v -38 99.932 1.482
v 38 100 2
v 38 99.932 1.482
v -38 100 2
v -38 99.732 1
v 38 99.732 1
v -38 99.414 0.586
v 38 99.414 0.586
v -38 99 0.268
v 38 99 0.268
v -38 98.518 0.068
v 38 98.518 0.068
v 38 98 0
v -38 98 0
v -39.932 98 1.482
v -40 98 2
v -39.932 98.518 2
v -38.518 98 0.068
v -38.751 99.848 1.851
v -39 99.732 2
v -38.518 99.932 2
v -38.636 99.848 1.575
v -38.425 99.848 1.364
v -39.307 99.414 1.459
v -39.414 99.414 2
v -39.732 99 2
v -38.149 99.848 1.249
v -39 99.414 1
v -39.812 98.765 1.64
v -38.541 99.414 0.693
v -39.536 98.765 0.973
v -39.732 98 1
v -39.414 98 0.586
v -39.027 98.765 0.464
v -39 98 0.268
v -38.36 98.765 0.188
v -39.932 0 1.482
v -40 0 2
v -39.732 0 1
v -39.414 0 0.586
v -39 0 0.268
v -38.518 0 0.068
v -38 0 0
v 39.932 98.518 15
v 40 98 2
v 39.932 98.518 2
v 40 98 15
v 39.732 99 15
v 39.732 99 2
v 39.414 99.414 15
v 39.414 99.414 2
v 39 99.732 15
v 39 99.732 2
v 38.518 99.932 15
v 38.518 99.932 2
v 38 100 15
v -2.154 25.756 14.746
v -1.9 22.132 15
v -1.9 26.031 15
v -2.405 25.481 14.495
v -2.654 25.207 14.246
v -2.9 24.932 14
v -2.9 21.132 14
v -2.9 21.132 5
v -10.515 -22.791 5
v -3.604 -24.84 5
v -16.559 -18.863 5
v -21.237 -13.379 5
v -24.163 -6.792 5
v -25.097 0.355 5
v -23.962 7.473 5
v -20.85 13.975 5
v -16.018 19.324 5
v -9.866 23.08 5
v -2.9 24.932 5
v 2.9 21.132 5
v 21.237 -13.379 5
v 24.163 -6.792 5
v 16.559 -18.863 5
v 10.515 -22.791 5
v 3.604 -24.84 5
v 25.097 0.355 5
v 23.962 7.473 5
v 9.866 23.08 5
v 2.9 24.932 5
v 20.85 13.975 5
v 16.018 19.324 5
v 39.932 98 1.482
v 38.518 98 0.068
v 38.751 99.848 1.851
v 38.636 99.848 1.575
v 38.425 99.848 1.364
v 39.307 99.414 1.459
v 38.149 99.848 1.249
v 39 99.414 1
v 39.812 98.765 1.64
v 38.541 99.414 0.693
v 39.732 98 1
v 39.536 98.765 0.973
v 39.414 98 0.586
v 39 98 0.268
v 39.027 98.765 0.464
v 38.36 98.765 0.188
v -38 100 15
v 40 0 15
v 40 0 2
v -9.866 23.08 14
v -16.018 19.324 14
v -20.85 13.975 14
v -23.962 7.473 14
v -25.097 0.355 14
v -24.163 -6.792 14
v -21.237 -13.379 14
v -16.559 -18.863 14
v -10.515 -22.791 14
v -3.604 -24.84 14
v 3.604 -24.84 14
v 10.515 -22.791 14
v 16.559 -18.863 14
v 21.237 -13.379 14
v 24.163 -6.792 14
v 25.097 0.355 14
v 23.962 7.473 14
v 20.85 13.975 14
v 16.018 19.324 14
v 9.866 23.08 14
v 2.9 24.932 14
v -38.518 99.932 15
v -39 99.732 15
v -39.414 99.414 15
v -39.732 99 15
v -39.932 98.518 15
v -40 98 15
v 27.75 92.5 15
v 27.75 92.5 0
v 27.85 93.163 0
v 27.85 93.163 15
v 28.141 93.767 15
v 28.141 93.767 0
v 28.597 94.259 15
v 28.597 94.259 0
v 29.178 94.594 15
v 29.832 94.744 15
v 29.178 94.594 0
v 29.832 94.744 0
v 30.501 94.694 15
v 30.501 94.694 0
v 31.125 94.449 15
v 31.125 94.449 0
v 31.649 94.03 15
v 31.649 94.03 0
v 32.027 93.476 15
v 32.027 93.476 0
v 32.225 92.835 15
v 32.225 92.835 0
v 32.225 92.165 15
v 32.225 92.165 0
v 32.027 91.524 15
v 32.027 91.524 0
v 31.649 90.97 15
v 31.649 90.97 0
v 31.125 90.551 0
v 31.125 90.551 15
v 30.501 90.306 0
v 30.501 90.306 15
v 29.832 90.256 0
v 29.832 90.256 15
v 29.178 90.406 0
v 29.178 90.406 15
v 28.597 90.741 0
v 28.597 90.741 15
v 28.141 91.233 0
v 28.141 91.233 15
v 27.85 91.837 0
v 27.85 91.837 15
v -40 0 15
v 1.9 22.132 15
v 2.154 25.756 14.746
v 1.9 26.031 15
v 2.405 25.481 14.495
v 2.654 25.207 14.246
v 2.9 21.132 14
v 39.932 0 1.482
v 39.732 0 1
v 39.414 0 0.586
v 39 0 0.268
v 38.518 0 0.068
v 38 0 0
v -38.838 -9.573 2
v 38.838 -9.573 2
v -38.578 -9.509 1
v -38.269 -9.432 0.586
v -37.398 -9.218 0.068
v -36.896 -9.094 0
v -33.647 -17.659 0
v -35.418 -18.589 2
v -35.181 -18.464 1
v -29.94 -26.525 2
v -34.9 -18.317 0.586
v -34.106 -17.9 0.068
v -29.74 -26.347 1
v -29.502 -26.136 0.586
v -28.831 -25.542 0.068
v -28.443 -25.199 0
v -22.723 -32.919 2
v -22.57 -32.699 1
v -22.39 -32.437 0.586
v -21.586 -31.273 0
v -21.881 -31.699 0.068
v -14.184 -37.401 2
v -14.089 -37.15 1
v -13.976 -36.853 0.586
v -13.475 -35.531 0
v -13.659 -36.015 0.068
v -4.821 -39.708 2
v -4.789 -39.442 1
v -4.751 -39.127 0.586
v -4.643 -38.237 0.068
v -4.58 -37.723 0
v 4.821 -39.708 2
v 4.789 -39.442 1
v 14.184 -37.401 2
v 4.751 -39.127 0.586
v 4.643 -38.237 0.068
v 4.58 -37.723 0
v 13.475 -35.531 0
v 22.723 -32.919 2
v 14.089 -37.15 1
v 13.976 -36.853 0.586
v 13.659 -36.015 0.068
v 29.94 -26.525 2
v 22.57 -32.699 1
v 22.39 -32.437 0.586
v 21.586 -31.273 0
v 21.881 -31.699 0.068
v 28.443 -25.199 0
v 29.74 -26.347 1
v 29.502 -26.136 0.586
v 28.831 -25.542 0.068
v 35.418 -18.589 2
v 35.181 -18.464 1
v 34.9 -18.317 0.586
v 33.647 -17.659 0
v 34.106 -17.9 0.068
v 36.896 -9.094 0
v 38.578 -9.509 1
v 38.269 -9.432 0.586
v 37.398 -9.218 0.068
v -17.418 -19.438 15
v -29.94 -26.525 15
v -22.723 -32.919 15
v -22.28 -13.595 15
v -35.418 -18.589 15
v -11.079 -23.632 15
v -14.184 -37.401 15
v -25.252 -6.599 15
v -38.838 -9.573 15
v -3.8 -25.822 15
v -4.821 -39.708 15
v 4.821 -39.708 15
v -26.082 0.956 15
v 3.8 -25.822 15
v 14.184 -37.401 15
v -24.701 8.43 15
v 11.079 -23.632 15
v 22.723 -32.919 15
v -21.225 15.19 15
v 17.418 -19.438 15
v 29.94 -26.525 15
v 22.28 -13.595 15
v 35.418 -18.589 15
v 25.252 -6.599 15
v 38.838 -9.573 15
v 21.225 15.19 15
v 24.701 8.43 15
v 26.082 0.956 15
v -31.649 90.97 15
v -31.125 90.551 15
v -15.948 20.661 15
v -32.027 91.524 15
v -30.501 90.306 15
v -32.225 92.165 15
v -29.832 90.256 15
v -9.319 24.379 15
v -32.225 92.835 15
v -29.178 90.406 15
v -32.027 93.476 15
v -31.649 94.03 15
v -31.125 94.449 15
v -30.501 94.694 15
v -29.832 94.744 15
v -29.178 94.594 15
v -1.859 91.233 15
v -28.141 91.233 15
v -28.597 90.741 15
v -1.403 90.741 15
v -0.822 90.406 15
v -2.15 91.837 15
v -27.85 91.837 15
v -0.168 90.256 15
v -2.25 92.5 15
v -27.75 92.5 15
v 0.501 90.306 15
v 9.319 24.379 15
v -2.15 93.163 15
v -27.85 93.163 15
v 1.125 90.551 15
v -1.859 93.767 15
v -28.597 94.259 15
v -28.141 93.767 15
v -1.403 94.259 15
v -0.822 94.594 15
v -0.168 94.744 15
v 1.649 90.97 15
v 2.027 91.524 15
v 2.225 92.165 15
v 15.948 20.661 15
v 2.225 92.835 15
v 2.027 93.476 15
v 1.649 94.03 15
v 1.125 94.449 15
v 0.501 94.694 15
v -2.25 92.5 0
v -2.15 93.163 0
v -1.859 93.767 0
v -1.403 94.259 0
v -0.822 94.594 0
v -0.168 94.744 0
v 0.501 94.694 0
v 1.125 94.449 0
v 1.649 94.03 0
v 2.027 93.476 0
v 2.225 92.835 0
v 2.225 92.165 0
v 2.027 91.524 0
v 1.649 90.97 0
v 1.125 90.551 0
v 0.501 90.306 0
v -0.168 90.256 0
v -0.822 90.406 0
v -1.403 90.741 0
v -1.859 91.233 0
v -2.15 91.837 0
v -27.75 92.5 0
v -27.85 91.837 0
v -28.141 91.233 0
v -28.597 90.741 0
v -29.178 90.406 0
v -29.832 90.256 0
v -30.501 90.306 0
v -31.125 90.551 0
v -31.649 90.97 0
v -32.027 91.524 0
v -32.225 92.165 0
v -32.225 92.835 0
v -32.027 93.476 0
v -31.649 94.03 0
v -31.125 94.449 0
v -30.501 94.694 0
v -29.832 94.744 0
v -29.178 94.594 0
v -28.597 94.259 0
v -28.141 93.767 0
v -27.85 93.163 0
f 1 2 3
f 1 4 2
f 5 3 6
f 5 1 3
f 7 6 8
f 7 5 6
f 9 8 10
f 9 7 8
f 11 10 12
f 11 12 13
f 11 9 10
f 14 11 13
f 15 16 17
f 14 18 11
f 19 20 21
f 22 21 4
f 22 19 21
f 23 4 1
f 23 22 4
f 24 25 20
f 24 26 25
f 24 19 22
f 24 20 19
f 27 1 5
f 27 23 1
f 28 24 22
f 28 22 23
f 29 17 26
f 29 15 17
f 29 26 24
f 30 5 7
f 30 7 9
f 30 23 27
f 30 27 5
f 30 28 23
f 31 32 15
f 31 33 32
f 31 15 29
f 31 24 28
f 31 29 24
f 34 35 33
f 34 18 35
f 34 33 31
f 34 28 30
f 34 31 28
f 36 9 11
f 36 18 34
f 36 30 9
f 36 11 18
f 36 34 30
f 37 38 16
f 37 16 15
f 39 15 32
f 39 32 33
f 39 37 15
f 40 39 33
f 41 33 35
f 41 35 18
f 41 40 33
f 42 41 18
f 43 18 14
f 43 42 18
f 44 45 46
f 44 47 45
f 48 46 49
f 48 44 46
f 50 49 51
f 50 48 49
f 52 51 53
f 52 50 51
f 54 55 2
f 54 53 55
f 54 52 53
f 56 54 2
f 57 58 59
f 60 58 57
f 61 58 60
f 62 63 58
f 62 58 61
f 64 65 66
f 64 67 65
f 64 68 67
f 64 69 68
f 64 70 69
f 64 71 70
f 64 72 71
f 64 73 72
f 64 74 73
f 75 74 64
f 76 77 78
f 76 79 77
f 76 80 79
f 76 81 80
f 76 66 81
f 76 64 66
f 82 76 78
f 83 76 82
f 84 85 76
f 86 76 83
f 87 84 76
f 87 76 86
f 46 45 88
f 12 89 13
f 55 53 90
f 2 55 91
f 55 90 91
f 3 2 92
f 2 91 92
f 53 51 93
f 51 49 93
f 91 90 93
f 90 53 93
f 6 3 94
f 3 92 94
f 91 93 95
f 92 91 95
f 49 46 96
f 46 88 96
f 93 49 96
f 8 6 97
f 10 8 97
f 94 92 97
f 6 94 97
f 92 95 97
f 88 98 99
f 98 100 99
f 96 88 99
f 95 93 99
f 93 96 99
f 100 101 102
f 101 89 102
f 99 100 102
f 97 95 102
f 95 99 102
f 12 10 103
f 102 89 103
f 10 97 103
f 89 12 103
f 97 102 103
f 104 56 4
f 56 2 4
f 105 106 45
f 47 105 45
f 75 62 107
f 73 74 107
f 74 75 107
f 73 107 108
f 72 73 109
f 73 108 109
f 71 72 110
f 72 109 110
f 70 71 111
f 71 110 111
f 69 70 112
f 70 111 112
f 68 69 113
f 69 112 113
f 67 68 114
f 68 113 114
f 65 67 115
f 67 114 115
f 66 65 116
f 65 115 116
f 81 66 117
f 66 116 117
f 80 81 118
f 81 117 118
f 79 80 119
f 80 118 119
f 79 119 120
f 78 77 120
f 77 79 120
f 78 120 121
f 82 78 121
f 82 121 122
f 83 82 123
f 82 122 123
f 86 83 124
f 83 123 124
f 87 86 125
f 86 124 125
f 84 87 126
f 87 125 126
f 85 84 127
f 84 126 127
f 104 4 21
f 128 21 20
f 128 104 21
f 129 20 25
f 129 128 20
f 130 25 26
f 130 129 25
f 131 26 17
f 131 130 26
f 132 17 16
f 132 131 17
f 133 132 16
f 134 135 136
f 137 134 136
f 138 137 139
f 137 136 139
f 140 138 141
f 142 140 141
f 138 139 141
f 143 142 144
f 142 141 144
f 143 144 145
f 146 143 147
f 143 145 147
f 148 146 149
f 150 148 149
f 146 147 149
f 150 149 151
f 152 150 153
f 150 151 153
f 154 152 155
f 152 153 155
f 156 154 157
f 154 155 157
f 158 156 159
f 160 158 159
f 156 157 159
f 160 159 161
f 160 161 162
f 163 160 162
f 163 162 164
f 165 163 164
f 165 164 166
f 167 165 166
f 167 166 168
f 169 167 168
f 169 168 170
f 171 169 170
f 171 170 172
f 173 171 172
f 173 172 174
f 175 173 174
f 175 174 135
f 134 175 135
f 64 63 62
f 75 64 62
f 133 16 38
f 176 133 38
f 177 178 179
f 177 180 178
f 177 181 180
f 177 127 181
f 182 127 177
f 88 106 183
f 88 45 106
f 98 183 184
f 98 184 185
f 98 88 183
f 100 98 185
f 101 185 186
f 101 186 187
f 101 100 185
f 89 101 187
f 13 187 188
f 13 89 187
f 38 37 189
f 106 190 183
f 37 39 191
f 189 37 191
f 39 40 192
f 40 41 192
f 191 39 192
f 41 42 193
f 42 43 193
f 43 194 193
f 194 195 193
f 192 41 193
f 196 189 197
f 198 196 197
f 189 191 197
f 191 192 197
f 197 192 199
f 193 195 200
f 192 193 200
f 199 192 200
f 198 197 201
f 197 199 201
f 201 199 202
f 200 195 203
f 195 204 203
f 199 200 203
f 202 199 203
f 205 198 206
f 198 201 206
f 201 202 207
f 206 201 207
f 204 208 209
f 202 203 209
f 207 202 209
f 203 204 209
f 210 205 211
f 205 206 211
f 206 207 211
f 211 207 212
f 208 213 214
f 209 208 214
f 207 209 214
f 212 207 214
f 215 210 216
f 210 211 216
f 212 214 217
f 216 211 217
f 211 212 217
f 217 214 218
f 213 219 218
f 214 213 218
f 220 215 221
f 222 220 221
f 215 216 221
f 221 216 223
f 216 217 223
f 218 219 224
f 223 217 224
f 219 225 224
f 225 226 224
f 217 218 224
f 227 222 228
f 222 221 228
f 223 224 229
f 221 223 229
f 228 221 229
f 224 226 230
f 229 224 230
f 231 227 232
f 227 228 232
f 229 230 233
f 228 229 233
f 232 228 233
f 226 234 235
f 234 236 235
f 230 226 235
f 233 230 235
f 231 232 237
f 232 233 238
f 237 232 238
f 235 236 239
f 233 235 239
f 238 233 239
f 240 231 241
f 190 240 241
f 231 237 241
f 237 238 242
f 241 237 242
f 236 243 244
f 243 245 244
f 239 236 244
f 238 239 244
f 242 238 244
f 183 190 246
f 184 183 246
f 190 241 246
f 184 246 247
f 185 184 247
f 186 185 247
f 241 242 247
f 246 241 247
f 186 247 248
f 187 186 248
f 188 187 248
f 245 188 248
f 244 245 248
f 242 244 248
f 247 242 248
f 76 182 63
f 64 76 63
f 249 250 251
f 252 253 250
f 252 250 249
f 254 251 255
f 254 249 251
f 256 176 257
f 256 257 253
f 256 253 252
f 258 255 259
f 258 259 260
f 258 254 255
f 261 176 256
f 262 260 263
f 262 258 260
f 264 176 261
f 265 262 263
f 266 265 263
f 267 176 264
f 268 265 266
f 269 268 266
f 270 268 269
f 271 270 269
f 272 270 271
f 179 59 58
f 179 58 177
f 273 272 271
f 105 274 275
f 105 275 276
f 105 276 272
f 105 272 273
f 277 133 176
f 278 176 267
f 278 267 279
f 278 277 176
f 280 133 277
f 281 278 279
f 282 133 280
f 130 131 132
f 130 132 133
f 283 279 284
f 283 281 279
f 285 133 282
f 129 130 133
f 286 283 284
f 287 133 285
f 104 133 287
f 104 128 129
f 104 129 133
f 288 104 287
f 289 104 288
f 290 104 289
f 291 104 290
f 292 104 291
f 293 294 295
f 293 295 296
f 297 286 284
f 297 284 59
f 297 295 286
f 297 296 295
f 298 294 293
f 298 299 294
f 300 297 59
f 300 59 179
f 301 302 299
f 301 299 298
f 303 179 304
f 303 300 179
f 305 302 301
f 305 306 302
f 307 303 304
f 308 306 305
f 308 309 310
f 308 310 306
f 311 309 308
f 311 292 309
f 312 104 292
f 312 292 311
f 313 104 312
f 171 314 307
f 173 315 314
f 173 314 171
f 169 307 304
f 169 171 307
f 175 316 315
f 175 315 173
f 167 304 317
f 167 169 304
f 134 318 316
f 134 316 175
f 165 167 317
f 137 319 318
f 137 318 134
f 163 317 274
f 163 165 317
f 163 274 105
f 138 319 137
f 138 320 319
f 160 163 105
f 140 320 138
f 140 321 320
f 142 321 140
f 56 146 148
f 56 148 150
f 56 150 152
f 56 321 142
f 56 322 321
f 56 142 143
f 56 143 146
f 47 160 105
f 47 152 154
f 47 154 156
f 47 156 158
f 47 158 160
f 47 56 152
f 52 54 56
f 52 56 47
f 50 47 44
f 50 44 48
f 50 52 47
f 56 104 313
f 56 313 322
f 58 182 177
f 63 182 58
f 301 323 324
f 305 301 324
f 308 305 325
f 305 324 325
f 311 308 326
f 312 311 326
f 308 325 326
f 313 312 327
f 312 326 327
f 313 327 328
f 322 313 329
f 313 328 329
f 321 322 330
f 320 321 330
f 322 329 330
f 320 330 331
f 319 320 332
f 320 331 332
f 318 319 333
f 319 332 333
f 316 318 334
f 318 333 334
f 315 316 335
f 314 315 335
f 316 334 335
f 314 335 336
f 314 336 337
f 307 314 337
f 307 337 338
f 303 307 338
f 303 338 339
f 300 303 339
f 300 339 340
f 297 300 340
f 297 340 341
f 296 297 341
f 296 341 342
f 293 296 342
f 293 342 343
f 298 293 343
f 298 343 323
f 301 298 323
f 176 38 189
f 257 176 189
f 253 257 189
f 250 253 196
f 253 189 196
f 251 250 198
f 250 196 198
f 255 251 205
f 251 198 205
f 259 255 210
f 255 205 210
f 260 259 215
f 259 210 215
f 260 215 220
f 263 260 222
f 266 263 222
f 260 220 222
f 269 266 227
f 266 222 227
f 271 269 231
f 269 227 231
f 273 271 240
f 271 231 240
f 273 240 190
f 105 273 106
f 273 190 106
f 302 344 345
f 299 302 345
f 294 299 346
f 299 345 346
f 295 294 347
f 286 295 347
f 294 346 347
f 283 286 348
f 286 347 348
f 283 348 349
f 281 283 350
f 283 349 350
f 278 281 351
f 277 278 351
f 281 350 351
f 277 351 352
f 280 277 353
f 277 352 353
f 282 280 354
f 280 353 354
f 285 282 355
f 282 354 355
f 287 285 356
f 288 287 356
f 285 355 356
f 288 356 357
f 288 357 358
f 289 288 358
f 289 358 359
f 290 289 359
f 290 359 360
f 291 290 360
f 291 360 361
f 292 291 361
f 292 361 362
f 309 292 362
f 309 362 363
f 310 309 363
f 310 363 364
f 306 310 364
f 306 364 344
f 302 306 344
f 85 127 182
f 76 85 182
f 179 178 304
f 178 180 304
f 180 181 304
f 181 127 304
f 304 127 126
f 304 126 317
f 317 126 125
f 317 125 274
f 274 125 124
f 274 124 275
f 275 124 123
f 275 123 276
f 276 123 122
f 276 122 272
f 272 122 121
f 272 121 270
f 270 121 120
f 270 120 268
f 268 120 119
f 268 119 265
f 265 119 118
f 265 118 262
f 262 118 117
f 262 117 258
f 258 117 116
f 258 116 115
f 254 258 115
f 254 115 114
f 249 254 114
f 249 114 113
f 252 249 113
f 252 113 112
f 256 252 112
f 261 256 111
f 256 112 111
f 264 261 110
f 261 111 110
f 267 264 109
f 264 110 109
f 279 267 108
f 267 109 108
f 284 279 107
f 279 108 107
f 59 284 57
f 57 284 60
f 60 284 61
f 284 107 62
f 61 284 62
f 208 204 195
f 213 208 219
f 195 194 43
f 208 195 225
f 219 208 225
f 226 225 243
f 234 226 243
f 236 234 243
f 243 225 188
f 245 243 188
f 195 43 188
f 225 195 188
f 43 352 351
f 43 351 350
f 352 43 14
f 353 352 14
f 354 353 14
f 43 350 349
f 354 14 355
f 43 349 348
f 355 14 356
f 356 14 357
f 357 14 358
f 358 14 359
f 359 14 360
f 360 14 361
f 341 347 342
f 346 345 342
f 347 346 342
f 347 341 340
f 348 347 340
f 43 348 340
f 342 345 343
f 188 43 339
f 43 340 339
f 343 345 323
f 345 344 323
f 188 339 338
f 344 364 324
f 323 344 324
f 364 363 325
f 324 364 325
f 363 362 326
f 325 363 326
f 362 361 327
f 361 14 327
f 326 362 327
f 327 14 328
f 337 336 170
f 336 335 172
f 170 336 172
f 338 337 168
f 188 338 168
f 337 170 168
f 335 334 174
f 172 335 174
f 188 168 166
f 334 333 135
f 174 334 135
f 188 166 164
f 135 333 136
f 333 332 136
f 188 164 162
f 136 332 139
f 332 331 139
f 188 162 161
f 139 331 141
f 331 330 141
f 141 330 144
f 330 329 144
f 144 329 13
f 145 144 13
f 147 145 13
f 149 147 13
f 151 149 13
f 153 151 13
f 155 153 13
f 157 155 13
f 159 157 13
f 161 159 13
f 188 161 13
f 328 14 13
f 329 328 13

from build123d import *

# Parameters (mm, degrees)
SKETCH1_R           = 40
BOSS_EXTRUDE1_DEPTH = 15
SKETCH2_R           = 25.1
CUT_EXTRUDE1_DEPTH  = 10
BOSS_EXTRUDE2_DEPTH = 10
CHAMFER1_SIZE       = 1
BOSS_EXTRUDE3_DEPTH = 15
SKETCH5_R           = 2.25
CUT_EXTRUDE2_DEPTH  = 109.742815855
FILLET1_R           = 2


with BuildPart() as part:
    # Sketch1 → Boss-Extrude1 (new body)
    with BuildSketch(Plane.XY):
        Circle(SKETCH1_R)
    extrude(amount=BOSS_EXTRUDE1_DEPTH)

    # Sketch2 → Cut-Extrude1 (cut)
    with BuildSketch(Plane.XY.offset(15)):
        Circle(SKETCH2_R)
    extrude(amount=-CUT_EXTRUDE1_DEPTH, mode=Mode.SUBTRACT)

    # Sketch3 → Boss-Extrude2 (add)
    with BuildSketch(Plane.XY.offset(15)):
        with BuildLine():
            Line((2.9, 21.131907268), (-2.9, 21.131907268))
            Line((-2.9, 21.131907268), (-2.9, 24.931907268))
            ThreePointArc((-2.9, 24.931907268), (0, 25.1), (2.9, 24.931907268))
            Line((2.9, 24.931907268), (2.9, 21.131907268))
        make_face()
    extrude(amount=-BOSS_EXTRUDE2_DEPTH)

    # Chamfer1
    chamfer1_edges = [part.edges().sort_by_distance(p)[0] for p in [
        (0, -25.1, 15),
        (-2.9, 23.031907268, 15),
        (0, 21.131907268, 15),
        (2.9, 23.031907268, 15),
    ]]
    chamfer(chamfer1_edges, length=CHAMFER1_SIZE)

    # Sketch4 → Boss-Extrude3 (add, through all)
    with BuildSketch(Plane(origin=(0, 0, 0), x_dir=(-1, 0, 0), z_dir=(0, 0, -1))):
        with BuildLine():
            Line((-40, 0), (-40, 100))
            Line((-40, 100), (40, 100))
            Line((40, 100), (40, 0))
            ThreePointArc((40, 0), (0, 40), (-40, 0))
        make_face()
    extrude(amount=-BOSS_EXTRUDE3_DEPTH)

    # Sketch5 → Cut-Extrude2 (cut, through all)
    with BuildSketch(Plane(origin=(0, 0, 0), x_dir=(-1, 0, 0), z_dir=(0, 0, -1))):
        with Locations((0, 92.5)):
            Circle(SKETCH5_R)
        with Locations((-30, 92.5)):
            Circle(SKETCH5_R)
        with Locations(Location((30, 92.5, 0), (0, 0, 180))):
            Circle(SKETCH5_R)
    extrude(amount=-CUT_EXTRUDE2_DEPTH, mode=Mode.SUBTRACT)

    # Fillet1
    fillet1_edges = [part.edges().sort_by_distance(p)[0] for p in [
        (0, -40, 0),
        (40, 100, 7.5),
        (-40, 100, 7.5),
        (-40, 50, 0),
        (0, 100, 0),
        (40, 50, 0),
    ]]
    fillet(fillet1_edges, radius=FILLET1_R)


solid = part.part
